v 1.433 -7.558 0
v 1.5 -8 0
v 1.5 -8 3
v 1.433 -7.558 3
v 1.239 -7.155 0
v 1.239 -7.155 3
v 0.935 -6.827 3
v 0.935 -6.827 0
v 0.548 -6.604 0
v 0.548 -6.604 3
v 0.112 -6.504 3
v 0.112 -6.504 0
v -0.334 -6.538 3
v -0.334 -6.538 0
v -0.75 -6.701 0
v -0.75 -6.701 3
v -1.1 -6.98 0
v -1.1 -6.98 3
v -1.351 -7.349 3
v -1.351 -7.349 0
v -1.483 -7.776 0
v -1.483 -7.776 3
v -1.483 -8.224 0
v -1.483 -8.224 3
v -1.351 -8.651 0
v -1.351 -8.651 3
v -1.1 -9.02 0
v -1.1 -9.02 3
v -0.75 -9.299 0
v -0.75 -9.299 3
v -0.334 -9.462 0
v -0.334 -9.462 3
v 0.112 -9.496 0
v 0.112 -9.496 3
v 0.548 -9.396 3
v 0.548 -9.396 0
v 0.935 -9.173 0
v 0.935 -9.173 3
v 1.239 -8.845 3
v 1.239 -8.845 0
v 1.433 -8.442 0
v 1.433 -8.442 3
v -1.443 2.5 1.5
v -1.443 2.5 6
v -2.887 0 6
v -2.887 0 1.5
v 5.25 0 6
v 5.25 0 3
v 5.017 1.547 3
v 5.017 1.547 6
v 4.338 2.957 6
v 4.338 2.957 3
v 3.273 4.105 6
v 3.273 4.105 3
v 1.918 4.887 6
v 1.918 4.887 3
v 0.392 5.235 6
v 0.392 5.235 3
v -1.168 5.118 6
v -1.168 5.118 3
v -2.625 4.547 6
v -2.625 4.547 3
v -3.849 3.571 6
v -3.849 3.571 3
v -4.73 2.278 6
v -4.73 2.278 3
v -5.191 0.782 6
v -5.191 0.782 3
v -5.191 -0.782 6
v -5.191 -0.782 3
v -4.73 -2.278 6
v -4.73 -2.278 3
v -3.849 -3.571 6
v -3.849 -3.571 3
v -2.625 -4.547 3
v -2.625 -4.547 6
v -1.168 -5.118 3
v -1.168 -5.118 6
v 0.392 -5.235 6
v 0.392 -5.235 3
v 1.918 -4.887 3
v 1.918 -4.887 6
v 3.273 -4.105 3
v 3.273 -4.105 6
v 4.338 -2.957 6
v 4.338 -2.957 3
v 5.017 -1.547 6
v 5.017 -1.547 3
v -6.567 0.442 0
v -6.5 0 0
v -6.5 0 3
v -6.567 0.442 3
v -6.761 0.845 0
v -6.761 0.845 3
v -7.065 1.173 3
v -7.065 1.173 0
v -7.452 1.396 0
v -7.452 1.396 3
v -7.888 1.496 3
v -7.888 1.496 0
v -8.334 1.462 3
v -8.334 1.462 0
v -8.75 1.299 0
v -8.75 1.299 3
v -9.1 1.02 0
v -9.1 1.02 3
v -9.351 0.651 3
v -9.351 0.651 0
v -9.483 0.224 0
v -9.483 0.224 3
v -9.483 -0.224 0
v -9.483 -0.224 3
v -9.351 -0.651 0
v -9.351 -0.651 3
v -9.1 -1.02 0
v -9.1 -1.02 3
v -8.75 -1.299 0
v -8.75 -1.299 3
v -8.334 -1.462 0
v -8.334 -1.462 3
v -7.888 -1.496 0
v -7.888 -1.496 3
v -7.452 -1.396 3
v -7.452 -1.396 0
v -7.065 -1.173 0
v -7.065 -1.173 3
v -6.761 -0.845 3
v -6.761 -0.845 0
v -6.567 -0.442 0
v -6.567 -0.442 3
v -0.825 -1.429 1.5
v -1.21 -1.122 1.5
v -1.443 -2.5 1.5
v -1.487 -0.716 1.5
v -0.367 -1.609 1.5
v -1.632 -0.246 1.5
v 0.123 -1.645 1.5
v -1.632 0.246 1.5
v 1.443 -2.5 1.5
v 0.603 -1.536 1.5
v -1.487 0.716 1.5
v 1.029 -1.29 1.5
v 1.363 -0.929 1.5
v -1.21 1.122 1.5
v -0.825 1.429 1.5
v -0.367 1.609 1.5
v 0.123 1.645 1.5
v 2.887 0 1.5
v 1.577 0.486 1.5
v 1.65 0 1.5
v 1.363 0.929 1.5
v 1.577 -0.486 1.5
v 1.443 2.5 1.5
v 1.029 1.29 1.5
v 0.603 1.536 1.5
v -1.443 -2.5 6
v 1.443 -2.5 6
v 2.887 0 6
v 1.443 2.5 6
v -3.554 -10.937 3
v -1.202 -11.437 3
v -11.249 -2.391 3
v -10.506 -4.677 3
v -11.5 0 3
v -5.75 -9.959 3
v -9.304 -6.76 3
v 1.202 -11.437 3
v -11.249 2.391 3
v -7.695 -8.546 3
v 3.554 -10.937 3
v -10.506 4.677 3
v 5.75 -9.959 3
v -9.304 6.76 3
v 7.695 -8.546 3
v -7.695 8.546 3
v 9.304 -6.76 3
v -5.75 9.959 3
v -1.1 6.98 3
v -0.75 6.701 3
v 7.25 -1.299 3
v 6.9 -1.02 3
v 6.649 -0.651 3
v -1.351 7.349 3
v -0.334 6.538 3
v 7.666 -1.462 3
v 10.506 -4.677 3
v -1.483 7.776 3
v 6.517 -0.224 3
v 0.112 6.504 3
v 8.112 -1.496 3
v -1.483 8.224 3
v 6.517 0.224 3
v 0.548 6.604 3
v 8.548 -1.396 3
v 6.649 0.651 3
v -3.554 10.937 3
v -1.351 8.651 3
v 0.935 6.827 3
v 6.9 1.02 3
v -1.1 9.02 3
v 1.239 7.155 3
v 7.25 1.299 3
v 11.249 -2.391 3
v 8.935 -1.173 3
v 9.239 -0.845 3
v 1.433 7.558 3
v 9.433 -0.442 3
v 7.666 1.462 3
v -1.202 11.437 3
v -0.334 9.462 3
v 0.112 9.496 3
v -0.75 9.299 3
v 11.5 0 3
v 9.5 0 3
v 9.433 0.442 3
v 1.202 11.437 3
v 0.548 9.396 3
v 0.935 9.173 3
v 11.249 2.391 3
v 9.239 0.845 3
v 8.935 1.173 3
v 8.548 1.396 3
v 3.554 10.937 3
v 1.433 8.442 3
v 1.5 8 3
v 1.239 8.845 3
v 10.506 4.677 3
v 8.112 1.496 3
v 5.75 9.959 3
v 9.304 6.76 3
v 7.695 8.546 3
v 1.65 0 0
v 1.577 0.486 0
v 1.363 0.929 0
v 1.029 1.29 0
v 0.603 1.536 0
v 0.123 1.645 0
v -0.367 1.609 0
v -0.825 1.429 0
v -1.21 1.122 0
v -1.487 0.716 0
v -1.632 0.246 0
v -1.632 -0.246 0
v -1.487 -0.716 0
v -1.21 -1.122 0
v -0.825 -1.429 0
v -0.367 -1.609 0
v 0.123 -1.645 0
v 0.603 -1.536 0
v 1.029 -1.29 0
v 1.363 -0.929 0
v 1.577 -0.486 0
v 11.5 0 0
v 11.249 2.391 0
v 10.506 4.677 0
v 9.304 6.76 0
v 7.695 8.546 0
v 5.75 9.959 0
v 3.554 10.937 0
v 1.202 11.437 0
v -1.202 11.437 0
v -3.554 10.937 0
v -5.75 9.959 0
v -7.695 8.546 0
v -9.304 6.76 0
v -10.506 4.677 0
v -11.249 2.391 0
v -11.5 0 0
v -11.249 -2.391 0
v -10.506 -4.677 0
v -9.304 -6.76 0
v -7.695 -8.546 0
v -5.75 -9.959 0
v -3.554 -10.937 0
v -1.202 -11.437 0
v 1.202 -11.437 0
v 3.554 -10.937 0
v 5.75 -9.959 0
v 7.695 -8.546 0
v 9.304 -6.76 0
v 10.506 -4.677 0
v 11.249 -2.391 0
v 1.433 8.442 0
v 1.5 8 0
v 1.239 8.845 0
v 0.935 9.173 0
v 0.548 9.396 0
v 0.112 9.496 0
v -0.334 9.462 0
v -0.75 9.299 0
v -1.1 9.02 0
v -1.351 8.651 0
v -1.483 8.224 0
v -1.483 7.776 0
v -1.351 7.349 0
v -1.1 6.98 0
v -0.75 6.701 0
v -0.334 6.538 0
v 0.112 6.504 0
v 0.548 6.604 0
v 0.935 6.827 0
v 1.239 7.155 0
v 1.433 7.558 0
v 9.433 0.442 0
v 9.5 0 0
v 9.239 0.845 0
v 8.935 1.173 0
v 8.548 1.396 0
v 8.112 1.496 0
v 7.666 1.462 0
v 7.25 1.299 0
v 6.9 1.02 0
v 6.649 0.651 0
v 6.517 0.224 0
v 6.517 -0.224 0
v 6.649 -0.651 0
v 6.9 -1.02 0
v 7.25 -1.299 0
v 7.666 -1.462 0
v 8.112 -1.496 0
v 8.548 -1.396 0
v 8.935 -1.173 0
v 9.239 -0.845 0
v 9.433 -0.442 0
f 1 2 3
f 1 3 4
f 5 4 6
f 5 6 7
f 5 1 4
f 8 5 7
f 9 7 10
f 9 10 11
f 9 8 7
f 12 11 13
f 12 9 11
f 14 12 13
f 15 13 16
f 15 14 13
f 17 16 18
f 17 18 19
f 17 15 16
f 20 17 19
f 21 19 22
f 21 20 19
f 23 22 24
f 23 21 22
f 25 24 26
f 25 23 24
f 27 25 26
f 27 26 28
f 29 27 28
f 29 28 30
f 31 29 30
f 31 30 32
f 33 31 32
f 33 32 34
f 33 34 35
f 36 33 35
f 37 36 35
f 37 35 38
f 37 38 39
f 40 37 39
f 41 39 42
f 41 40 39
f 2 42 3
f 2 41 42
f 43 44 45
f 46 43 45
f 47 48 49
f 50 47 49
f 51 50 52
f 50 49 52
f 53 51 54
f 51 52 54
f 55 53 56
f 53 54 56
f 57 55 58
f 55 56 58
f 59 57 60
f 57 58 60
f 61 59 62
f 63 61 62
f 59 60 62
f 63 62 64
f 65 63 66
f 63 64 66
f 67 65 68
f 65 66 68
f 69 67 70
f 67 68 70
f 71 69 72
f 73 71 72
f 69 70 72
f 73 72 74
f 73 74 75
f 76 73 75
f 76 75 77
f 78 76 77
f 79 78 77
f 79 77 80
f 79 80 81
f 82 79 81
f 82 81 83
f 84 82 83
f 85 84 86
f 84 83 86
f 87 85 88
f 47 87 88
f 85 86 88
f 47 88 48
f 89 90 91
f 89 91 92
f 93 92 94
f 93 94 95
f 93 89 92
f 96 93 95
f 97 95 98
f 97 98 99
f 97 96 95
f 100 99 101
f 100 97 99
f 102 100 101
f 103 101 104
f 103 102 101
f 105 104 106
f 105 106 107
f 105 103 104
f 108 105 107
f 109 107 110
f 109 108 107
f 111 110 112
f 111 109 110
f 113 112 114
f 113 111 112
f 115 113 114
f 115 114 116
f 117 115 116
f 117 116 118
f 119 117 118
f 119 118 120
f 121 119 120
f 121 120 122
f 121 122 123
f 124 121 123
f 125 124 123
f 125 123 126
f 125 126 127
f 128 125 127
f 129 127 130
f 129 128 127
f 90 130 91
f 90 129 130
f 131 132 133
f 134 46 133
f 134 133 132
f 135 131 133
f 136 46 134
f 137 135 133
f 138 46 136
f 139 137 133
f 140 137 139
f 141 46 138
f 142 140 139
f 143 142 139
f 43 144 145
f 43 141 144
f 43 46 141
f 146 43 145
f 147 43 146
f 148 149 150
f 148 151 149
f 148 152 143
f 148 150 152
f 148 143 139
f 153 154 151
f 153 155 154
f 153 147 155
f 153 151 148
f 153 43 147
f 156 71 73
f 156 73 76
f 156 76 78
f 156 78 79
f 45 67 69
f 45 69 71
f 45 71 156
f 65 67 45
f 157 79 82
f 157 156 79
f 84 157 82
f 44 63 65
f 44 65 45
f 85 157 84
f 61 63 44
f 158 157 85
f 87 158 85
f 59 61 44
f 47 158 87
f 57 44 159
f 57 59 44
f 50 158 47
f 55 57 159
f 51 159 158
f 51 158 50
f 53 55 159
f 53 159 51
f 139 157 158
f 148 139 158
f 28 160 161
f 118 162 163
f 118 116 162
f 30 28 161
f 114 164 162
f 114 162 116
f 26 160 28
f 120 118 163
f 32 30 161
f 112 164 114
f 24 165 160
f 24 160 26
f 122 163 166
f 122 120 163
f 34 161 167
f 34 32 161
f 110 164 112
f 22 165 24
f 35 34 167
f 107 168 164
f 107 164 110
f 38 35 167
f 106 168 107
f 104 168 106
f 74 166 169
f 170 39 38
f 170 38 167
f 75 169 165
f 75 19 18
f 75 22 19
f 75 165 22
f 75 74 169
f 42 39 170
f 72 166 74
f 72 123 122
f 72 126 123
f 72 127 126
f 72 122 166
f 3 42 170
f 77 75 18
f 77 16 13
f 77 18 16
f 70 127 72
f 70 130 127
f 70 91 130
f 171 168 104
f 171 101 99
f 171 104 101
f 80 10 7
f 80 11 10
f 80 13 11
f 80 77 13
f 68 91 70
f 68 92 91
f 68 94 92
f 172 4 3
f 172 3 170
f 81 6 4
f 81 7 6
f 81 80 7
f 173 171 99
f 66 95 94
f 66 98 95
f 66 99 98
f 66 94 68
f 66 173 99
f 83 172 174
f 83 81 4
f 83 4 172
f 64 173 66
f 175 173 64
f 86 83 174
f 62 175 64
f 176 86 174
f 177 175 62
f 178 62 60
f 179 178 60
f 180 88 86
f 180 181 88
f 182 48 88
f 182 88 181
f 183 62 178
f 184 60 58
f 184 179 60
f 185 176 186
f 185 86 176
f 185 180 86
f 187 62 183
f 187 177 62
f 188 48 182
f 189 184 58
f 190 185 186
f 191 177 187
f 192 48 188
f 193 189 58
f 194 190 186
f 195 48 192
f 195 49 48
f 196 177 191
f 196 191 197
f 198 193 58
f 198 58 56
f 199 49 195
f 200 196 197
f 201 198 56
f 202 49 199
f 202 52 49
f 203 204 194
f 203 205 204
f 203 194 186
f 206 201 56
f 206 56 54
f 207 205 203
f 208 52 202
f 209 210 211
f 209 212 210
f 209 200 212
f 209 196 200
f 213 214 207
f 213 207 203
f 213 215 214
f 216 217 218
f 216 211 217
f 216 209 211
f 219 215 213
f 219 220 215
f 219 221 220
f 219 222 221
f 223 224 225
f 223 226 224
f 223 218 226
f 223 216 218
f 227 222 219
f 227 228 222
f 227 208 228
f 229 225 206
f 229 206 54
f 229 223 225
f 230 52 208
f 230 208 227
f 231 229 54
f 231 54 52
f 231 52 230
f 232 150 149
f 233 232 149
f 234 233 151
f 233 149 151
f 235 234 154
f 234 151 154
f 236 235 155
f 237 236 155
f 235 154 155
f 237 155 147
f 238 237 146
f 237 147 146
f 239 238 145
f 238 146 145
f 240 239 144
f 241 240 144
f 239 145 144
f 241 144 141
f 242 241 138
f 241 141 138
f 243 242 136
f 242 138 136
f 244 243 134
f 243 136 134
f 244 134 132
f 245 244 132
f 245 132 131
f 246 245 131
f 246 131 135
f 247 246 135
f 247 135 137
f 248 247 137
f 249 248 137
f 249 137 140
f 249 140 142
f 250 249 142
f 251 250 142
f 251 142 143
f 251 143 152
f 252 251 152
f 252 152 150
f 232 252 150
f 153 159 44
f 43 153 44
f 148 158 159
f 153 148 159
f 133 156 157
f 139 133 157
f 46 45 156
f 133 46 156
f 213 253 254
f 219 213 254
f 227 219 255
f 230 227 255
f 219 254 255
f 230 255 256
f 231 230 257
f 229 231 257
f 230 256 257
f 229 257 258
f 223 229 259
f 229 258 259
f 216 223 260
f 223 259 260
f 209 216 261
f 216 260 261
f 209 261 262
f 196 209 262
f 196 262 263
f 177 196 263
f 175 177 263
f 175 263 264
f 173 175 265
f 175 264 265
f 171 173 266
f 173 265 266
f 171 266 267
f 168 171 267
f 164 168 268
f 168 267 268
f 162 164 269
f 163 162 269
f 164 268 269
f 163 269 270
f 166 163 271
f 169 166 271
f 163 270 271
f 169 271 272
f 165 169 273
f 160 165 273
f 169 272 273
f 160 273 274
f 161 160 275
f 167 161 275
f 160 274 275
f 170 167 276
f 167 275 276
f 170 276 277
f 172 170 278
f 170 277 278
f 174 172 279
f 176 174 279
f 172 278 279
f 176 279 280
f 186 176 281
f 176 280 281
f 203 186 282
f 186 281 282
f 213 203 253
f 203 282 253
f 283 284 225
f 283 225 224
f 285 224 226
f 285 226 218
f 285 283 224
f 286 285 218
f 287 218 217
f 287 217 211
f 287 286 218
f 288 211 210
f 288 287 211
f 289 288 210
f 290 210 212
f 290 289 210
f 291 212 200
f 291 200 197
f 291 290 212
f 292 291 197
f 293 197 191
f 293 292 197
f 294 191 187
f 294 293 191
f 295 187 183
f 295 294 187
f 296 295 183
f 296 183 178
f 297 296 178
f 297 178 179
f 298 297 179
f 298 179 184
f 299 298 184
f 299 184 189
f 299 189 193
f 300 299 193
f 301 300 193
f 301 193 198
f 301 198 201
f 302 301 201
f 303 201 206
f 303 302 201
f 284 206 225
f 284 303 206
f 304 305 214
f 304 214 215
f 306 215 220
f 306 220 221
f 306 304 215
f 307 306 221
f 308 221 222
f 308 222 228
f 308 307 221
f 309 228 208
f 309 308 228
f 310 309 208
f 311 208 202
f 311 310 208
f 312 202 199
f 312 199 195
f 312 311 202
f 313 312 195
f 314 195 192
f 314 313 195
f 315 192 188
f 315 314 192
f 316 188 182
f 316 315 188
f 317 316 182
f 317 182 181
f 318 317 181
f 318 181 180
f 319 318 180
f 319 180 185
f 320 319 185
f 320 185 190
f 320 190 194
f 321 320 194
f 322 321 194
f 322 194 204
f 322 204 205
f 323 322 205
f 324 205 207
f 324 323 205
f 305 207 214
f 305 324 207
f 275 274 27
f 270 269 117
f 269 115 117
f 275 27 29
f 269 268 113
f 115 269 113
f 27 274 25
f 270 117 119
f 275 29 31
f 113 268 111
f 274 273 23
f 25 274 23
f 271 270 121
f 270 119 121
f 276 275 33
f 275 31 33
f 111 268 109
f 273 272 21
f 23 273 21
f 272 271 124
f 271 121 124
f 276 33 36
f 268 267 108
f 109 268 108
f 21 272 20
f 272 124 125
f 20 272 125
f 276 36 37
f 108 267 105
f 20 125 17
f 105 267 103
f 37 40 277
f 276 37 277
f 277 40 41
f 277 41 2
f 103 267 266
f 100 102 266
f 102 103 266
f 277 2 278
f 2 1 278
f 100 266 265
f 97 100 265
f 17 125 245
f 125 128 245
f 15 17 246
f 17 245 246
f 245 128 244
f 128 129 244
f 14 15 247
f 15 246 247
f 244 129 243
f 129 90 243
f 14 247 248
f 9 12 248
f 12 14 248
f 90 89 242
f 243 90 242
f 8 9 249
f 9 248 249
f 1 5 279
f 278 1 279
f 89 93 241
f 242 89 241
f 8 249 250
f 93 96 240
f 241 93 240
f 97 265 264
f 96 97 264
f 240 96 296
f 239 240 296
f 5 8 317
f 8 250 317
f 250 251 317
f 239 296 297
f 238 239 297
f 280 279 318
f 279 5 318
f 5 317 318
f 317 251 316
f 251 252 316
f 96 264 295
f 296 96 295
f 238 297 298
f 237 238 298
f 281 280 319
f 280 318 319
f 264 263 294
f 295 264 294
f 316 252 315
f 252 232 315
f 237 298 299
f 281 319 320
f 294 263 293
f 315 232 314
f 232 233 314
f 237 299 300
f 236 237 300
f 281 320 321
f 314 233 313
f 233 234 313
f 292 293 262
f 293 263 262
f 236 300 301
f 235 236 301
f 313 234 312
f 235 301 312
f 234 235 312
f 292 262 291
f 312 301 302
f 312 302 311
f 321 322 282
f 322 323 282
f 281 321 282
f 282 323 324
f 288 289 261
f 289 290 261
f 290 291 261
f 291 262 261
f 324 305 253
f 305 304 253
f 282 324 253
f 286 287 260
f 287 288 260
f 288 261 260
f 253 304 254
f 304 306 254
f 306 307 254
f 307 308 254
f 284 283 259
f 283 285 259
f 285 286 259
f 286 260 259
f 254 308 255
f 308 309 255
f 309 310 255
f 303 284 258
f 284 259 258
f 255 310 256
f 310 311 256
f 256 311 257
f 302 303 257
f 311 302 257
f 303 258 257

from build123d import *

# Parameters (mm, degrees)
SKETCH_1_R          = 11.5
SKETCH_1_R_2        = 1.5
EXTRUDE_1_DEPTH     = 3
SKETCH_2_R          = 5.25
EXTRUDE_2_DEPTH     = 3
CUT_EXTRUDE_1_DEPTH = 4.5
CUT_EXTRUDE_2_REACH = 3.5
SKETCH_4_R          = 1.65


with BuildPart() as part:
    # 草圖1 → 填料-伸長1 (new body)
    with BuildSketch(Plane.XY):
        Circle(SKETCH_1_R)
        with Locations((0, 8)):
            Circle(SKETCH_1_R_2, mode=Mode.SUBTRACT)
        with Locations((8, 0)):
            Circle(SKETCH_1_R_2, mode=Mode.SUBTRACT)
        with Locations((0, -8)):
            Circle(SKETCH_1_R_2, mode=Mode.SUBTRACT)
        with Locations((-8, 0)):
            Circle(SKETCH_1_R_2, mode=Mode.SUBTRACT)
    extrude(amount=EXTRUDE_1_DEPTH)

    # 草圖2 → 填料-伸長2 (add)
    with BuildSketch(Plane.XY.offset(3)):
        Circle(SKETCH_2_R)
    extrude(amount=EXTRUDE_2_DEPTH)

    # 草圖3 → 除料-伸長1 (cut)
    with BuildSketch(Plane.XY.offset(6)):
        Polygon((2.886751346, 0), (1.443375673, 2.5), (-1.443375673, 2.5), (-2.886751346, 0), (-1.443375673, -2.5), (1.443375673, -2.5), align=None)
    extrude(amount=-CUT_EXTRUDE_1_DEPTH, mode=Mode.SUBTRACT)

    # 草圖4 → 除料-伸長2 (cut, up to next)
    with BuildSketch(Plane.XY.offset(1.5), mode=Mode.PRIVATE) as cut_extrude_2_sk1:
        Circle(SKETCH_4_R)
    cut_extrude_2_tool1 = extrude(cut_extrude_2_sk1.sketch, amount=-CUT_EXTRUDE_2_REACH, mode=Mode.PRIVATE) & part.part
    add(cut_extrude_2_tool1.solids().sort_by_distance((0, 0, 1.5))[0], mode=Mode.SUBTRACT)


solid = part.part
